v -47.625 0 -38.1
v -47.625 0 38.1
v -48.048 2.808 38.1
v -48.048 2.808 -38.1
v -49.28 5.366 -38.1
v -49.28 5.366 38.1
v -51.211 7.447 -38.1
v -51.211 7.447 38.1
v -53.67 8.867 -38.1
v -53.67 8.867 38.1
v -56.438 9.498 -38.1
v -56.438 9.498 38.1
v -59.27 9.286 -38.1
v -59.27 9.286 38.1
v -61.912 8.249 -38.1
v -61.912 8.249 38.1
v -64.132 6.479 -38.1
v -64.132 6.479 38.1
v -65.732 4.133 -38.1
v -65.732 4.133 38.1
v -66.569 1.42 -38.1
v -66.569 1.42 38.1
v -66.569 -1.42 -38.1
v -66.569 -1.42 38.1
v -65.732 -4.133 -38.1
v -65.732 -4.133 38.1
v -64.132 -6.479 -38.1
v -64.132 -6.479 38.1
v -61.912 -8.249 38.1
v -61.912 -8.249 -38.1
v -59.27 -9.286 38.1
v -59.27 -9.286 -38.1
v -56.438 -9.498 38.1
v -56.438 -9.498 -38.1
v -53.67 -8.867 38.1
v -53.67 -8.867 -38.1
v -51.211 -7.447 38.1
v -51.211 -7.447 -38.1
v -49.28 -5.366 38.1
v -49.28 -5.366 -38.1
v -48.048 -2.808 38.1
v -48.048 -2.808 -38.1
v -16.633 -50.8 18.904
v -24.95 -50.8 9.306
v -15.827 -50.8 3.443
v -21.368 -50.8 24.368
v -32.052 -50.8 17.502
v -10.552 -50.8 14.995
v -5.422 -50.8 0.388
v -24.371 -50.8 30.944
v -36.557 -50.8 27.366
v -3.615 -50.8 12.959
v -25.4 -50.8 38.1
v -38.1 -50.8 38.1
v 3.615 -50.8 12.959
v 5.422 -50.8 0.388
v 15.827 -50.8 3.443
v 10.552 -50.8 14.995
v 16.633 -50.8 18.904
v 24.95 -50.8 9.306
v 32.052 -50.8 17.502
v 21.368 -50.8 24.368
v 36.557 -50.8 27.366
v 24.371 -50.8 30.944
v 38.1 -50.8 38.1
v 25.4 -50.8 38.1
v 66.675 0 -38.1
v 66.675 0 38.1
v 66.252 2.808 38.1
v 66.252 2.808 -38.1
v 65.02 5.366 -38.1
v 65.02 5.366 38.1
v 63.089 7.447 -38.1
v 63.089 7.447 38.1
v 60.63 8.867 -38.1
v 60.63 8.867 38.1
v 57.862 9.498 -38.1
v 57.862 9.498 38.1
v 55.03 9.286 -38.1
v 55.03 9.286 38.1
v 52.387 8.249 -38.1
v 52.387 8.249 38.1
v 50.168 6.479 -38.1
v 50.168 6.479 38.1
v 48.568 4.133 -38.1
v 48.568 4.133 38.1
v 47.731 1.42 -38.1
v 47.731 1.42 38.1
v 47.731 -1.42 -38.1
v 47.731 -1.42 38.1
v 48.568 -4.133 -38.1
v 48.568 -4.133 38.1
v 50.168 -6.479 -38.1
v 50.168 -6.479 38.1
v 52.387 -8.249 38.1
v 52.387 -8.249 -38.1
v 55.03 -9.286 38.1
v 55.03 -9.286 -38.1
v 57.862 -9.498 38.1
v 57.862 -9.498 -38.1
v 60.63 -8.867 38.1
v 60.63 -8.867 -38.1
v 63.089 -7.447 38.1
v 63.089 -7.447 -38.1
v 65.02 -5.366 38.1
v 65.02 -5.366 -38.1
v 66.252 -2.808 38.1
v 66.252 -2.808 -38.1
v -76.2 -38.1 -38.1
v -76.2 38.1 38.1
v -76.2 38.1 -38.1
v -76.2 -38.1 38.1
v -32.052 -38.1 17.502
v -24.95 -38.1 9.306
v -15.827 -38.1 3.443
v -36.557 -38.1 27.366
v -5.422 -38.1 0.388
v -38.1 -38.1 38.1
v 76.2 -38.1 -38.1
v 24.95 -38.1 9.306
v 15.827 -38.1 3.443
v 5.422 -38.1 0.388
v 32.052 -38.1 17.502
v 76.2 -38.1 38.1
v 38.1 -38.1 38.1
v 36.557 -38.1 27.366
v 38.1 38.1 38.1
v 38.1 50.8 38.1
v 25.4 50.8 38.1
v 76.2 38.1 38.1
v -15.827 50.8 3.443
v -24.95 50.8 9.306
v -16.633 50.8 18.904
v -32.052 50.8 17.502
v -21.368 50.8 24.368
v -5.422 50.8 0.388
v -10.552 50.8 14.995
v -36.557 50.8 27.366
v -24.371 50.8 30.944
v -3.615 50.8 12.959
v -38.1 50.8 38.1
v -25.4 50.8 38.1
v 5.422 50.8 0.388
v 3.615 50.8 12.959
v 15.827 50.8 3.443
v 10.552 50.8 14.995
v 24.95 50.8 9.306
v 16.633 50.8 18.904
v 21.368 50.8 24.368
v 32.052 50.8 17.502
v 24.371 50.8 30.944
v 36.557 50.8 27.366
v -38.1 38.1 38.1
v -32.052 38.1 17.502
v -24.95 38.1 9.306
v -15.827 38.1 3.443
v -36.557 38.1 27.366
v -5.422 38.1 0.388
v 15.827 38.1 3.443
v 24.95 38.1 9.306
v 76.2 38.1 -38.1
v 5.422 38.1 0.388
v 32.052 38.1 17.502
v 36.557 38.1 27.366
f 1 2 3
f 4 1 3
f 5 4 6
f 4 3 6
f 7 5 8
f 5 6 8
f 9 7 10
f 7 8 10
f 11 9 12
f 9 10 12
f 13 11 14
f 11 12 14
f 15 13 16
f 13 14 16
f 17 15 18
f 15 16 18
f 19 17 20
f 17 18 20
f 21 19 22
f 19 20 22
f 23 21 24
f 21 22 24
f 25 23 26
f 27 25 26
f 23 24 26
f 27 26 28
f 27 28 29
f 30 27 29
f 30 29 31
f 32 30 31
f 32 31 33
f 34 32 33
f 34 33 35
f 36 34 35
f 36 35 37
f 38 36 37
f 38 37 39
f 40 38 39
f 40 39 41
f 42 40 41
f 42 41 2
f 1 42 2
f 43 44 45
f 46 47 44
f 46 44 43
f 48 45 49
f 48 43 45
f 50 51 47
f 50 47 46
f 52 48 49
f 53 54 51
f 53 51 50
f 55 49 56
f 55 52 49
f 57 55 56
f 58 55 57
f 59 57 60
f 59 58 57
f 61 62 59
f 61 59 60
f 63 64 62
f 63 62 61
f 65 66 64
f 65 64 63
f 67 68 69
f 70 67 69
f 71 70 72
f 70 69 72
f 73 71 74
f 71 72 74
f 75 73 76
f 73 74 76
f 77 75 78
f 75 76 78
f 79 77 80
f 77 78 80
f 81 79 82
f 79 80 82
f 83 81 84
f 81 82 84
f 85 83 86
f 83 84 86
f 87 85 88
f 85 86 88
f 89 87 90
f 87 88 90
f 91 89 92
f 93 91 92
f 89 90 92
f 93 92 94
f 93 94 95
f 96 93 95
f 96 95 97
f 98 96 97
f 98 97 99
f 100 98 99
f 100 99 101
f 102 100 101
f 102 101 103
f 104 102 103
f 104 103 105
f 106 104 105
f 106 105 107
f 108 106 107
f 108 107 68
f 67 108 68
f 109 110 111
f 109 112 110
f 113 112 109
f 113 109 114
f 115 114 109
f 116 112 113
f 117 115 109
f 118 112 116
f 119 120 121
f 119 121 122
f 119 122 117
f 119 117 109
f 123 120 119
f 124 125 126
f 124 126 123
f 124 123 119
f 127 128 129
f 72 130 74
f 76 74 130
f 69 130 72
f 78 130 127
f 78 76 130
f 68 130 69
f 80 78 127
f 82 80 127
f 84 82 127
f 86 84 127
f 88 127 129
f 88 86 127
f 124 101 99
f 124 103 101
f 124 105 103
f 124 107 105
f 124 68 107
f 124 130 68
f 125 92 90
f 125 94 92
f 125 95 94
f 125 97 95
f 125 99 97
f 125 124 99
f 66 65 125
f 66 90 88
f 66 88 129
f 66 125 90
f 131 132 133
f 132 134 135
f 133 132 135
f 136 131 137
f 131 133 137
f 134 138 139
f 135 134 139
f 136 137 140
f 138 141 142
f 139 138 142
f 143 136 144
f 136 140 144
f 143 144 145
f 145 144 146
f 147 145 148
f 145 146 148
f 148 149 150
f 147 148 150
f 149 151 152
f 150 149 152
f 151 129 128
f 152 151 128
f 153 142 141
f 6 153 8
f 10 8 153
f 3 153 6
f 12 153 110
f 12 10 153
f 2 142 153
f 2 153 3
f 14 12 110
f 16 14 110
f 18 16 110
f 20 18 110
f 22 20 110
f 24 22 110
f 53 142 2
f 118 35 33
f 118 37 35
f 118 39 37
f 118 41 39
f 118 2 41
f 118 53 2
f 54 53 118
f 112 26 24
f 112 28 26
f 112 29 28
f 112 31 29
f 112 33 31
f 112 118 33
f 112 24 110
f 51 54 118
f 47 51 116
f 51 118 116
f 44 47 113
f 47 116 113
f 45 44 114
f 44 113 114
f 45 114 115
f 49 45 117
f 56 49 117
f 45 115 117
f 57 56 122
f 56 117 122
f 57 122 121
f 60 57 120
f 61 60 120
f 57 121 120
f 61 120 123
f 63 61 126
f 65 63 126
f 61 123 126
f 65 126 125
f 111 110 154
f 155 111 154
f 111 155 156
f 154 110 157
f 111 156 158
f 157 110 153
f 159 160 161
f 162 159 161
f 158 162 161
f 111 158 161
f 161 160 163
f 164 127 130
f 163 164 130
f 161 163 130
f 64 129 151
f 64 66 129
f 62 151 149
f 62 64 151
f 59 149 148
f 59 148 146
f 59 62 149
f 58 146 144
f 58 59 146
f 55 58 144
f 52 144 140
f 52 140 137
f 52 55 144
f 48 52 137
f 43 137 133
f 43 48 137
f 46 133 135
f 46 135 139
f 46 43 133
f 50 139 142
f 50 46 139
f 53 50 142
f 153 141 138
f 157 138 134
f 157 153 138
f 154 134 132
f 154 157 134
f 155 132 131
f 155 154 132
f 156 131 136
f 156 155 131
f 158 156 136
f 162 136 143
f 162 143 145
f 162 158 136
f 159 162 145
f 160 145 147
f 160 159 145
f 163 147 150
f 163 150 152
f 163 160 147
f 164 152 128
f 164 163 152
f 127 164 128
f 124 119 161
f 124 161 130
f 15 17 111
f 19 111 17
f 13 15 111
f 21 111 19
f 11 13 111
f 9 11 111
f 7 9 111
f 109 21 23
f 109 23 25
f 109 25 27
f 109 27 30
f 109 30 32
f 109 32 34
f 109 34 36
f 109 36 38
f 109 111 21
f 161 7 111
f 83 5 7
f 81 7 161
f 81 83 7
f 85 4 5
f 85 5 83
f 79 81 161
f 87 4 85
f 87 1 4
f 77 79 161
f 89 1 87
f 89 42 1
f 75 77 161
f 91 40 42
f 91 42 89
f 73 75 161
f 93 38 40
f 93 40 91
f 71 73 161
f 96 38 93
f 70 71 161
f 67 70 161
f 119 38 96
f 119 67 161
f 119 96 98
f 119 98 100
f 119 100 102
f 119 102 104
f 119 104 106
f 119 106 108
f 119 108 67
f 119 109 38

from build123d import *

# Parameters (mm, degrees)
F1_DEPTH      = 38.1
F3_DEPTH      = 12.7
F3_DEPTH_BACK = 88.9
F4_R          = 9.525
F5_R          = 9.525
F6_DEPTH      = 113.03


with BuildPart() as f1:
    # F0 (on Front) → F1 (new body, symmetric)
    with BuildSketch(Plane.XZ):
        with BuildLine():
            Line((-76.2, 38.1), (-76.2, -38.1))
            Line((-76.2, -38.1), (76.2, -38.1))
            Line((76.2, -38.1), (76.2, 38.1))
            Line((76.2, 38.1), (38.1, 38.1))
            ThreePointArc((38.1, 38.1), (0, 0), (-38.1, 38.1))
            Line((-38.1, 38.1), (-76.2, 38.1))
        make_face()
    extrude(amount=F1_DEPTH, both=True)

    # F2 (on face) → F3 (join, two sides)
    with BuildSketch(Plane.XZ.offset(38.1)) as f3_sk:
        with BuildLine():
            Line((-25.4, 38.1), (-38.1, 38.1))
            ThreePointArc((-38.1, 38.1), (0, 0), (38.1, 38.1))
            Line((38.1, 38.1), (25.4, 38.1))
            ThreePointArc((25.4, 38.1), (0, 12.7), (-25.4, 38.1))
        make_face()
    extrude(amount=F3_DEPTH)
    extrude(f3_sk.sketch, amount=-F3_DEPTH_BACK)

    # F4 (on face) + F5 (on face) → F6 (cut)
    with BuildSketch(Plane.XY.offset(38.1)):
        with Locations((-57.15, 0)):
            Circle(F4_R)
    with BuildSketch(Plane.XY.offset(38.1)):
        with Locations((57.15, 0)):
            Circle(F5_R)
    extrude(amount=-F6_DEPTH, mode=Mode.SUBTRACT)


solid = f1.part
